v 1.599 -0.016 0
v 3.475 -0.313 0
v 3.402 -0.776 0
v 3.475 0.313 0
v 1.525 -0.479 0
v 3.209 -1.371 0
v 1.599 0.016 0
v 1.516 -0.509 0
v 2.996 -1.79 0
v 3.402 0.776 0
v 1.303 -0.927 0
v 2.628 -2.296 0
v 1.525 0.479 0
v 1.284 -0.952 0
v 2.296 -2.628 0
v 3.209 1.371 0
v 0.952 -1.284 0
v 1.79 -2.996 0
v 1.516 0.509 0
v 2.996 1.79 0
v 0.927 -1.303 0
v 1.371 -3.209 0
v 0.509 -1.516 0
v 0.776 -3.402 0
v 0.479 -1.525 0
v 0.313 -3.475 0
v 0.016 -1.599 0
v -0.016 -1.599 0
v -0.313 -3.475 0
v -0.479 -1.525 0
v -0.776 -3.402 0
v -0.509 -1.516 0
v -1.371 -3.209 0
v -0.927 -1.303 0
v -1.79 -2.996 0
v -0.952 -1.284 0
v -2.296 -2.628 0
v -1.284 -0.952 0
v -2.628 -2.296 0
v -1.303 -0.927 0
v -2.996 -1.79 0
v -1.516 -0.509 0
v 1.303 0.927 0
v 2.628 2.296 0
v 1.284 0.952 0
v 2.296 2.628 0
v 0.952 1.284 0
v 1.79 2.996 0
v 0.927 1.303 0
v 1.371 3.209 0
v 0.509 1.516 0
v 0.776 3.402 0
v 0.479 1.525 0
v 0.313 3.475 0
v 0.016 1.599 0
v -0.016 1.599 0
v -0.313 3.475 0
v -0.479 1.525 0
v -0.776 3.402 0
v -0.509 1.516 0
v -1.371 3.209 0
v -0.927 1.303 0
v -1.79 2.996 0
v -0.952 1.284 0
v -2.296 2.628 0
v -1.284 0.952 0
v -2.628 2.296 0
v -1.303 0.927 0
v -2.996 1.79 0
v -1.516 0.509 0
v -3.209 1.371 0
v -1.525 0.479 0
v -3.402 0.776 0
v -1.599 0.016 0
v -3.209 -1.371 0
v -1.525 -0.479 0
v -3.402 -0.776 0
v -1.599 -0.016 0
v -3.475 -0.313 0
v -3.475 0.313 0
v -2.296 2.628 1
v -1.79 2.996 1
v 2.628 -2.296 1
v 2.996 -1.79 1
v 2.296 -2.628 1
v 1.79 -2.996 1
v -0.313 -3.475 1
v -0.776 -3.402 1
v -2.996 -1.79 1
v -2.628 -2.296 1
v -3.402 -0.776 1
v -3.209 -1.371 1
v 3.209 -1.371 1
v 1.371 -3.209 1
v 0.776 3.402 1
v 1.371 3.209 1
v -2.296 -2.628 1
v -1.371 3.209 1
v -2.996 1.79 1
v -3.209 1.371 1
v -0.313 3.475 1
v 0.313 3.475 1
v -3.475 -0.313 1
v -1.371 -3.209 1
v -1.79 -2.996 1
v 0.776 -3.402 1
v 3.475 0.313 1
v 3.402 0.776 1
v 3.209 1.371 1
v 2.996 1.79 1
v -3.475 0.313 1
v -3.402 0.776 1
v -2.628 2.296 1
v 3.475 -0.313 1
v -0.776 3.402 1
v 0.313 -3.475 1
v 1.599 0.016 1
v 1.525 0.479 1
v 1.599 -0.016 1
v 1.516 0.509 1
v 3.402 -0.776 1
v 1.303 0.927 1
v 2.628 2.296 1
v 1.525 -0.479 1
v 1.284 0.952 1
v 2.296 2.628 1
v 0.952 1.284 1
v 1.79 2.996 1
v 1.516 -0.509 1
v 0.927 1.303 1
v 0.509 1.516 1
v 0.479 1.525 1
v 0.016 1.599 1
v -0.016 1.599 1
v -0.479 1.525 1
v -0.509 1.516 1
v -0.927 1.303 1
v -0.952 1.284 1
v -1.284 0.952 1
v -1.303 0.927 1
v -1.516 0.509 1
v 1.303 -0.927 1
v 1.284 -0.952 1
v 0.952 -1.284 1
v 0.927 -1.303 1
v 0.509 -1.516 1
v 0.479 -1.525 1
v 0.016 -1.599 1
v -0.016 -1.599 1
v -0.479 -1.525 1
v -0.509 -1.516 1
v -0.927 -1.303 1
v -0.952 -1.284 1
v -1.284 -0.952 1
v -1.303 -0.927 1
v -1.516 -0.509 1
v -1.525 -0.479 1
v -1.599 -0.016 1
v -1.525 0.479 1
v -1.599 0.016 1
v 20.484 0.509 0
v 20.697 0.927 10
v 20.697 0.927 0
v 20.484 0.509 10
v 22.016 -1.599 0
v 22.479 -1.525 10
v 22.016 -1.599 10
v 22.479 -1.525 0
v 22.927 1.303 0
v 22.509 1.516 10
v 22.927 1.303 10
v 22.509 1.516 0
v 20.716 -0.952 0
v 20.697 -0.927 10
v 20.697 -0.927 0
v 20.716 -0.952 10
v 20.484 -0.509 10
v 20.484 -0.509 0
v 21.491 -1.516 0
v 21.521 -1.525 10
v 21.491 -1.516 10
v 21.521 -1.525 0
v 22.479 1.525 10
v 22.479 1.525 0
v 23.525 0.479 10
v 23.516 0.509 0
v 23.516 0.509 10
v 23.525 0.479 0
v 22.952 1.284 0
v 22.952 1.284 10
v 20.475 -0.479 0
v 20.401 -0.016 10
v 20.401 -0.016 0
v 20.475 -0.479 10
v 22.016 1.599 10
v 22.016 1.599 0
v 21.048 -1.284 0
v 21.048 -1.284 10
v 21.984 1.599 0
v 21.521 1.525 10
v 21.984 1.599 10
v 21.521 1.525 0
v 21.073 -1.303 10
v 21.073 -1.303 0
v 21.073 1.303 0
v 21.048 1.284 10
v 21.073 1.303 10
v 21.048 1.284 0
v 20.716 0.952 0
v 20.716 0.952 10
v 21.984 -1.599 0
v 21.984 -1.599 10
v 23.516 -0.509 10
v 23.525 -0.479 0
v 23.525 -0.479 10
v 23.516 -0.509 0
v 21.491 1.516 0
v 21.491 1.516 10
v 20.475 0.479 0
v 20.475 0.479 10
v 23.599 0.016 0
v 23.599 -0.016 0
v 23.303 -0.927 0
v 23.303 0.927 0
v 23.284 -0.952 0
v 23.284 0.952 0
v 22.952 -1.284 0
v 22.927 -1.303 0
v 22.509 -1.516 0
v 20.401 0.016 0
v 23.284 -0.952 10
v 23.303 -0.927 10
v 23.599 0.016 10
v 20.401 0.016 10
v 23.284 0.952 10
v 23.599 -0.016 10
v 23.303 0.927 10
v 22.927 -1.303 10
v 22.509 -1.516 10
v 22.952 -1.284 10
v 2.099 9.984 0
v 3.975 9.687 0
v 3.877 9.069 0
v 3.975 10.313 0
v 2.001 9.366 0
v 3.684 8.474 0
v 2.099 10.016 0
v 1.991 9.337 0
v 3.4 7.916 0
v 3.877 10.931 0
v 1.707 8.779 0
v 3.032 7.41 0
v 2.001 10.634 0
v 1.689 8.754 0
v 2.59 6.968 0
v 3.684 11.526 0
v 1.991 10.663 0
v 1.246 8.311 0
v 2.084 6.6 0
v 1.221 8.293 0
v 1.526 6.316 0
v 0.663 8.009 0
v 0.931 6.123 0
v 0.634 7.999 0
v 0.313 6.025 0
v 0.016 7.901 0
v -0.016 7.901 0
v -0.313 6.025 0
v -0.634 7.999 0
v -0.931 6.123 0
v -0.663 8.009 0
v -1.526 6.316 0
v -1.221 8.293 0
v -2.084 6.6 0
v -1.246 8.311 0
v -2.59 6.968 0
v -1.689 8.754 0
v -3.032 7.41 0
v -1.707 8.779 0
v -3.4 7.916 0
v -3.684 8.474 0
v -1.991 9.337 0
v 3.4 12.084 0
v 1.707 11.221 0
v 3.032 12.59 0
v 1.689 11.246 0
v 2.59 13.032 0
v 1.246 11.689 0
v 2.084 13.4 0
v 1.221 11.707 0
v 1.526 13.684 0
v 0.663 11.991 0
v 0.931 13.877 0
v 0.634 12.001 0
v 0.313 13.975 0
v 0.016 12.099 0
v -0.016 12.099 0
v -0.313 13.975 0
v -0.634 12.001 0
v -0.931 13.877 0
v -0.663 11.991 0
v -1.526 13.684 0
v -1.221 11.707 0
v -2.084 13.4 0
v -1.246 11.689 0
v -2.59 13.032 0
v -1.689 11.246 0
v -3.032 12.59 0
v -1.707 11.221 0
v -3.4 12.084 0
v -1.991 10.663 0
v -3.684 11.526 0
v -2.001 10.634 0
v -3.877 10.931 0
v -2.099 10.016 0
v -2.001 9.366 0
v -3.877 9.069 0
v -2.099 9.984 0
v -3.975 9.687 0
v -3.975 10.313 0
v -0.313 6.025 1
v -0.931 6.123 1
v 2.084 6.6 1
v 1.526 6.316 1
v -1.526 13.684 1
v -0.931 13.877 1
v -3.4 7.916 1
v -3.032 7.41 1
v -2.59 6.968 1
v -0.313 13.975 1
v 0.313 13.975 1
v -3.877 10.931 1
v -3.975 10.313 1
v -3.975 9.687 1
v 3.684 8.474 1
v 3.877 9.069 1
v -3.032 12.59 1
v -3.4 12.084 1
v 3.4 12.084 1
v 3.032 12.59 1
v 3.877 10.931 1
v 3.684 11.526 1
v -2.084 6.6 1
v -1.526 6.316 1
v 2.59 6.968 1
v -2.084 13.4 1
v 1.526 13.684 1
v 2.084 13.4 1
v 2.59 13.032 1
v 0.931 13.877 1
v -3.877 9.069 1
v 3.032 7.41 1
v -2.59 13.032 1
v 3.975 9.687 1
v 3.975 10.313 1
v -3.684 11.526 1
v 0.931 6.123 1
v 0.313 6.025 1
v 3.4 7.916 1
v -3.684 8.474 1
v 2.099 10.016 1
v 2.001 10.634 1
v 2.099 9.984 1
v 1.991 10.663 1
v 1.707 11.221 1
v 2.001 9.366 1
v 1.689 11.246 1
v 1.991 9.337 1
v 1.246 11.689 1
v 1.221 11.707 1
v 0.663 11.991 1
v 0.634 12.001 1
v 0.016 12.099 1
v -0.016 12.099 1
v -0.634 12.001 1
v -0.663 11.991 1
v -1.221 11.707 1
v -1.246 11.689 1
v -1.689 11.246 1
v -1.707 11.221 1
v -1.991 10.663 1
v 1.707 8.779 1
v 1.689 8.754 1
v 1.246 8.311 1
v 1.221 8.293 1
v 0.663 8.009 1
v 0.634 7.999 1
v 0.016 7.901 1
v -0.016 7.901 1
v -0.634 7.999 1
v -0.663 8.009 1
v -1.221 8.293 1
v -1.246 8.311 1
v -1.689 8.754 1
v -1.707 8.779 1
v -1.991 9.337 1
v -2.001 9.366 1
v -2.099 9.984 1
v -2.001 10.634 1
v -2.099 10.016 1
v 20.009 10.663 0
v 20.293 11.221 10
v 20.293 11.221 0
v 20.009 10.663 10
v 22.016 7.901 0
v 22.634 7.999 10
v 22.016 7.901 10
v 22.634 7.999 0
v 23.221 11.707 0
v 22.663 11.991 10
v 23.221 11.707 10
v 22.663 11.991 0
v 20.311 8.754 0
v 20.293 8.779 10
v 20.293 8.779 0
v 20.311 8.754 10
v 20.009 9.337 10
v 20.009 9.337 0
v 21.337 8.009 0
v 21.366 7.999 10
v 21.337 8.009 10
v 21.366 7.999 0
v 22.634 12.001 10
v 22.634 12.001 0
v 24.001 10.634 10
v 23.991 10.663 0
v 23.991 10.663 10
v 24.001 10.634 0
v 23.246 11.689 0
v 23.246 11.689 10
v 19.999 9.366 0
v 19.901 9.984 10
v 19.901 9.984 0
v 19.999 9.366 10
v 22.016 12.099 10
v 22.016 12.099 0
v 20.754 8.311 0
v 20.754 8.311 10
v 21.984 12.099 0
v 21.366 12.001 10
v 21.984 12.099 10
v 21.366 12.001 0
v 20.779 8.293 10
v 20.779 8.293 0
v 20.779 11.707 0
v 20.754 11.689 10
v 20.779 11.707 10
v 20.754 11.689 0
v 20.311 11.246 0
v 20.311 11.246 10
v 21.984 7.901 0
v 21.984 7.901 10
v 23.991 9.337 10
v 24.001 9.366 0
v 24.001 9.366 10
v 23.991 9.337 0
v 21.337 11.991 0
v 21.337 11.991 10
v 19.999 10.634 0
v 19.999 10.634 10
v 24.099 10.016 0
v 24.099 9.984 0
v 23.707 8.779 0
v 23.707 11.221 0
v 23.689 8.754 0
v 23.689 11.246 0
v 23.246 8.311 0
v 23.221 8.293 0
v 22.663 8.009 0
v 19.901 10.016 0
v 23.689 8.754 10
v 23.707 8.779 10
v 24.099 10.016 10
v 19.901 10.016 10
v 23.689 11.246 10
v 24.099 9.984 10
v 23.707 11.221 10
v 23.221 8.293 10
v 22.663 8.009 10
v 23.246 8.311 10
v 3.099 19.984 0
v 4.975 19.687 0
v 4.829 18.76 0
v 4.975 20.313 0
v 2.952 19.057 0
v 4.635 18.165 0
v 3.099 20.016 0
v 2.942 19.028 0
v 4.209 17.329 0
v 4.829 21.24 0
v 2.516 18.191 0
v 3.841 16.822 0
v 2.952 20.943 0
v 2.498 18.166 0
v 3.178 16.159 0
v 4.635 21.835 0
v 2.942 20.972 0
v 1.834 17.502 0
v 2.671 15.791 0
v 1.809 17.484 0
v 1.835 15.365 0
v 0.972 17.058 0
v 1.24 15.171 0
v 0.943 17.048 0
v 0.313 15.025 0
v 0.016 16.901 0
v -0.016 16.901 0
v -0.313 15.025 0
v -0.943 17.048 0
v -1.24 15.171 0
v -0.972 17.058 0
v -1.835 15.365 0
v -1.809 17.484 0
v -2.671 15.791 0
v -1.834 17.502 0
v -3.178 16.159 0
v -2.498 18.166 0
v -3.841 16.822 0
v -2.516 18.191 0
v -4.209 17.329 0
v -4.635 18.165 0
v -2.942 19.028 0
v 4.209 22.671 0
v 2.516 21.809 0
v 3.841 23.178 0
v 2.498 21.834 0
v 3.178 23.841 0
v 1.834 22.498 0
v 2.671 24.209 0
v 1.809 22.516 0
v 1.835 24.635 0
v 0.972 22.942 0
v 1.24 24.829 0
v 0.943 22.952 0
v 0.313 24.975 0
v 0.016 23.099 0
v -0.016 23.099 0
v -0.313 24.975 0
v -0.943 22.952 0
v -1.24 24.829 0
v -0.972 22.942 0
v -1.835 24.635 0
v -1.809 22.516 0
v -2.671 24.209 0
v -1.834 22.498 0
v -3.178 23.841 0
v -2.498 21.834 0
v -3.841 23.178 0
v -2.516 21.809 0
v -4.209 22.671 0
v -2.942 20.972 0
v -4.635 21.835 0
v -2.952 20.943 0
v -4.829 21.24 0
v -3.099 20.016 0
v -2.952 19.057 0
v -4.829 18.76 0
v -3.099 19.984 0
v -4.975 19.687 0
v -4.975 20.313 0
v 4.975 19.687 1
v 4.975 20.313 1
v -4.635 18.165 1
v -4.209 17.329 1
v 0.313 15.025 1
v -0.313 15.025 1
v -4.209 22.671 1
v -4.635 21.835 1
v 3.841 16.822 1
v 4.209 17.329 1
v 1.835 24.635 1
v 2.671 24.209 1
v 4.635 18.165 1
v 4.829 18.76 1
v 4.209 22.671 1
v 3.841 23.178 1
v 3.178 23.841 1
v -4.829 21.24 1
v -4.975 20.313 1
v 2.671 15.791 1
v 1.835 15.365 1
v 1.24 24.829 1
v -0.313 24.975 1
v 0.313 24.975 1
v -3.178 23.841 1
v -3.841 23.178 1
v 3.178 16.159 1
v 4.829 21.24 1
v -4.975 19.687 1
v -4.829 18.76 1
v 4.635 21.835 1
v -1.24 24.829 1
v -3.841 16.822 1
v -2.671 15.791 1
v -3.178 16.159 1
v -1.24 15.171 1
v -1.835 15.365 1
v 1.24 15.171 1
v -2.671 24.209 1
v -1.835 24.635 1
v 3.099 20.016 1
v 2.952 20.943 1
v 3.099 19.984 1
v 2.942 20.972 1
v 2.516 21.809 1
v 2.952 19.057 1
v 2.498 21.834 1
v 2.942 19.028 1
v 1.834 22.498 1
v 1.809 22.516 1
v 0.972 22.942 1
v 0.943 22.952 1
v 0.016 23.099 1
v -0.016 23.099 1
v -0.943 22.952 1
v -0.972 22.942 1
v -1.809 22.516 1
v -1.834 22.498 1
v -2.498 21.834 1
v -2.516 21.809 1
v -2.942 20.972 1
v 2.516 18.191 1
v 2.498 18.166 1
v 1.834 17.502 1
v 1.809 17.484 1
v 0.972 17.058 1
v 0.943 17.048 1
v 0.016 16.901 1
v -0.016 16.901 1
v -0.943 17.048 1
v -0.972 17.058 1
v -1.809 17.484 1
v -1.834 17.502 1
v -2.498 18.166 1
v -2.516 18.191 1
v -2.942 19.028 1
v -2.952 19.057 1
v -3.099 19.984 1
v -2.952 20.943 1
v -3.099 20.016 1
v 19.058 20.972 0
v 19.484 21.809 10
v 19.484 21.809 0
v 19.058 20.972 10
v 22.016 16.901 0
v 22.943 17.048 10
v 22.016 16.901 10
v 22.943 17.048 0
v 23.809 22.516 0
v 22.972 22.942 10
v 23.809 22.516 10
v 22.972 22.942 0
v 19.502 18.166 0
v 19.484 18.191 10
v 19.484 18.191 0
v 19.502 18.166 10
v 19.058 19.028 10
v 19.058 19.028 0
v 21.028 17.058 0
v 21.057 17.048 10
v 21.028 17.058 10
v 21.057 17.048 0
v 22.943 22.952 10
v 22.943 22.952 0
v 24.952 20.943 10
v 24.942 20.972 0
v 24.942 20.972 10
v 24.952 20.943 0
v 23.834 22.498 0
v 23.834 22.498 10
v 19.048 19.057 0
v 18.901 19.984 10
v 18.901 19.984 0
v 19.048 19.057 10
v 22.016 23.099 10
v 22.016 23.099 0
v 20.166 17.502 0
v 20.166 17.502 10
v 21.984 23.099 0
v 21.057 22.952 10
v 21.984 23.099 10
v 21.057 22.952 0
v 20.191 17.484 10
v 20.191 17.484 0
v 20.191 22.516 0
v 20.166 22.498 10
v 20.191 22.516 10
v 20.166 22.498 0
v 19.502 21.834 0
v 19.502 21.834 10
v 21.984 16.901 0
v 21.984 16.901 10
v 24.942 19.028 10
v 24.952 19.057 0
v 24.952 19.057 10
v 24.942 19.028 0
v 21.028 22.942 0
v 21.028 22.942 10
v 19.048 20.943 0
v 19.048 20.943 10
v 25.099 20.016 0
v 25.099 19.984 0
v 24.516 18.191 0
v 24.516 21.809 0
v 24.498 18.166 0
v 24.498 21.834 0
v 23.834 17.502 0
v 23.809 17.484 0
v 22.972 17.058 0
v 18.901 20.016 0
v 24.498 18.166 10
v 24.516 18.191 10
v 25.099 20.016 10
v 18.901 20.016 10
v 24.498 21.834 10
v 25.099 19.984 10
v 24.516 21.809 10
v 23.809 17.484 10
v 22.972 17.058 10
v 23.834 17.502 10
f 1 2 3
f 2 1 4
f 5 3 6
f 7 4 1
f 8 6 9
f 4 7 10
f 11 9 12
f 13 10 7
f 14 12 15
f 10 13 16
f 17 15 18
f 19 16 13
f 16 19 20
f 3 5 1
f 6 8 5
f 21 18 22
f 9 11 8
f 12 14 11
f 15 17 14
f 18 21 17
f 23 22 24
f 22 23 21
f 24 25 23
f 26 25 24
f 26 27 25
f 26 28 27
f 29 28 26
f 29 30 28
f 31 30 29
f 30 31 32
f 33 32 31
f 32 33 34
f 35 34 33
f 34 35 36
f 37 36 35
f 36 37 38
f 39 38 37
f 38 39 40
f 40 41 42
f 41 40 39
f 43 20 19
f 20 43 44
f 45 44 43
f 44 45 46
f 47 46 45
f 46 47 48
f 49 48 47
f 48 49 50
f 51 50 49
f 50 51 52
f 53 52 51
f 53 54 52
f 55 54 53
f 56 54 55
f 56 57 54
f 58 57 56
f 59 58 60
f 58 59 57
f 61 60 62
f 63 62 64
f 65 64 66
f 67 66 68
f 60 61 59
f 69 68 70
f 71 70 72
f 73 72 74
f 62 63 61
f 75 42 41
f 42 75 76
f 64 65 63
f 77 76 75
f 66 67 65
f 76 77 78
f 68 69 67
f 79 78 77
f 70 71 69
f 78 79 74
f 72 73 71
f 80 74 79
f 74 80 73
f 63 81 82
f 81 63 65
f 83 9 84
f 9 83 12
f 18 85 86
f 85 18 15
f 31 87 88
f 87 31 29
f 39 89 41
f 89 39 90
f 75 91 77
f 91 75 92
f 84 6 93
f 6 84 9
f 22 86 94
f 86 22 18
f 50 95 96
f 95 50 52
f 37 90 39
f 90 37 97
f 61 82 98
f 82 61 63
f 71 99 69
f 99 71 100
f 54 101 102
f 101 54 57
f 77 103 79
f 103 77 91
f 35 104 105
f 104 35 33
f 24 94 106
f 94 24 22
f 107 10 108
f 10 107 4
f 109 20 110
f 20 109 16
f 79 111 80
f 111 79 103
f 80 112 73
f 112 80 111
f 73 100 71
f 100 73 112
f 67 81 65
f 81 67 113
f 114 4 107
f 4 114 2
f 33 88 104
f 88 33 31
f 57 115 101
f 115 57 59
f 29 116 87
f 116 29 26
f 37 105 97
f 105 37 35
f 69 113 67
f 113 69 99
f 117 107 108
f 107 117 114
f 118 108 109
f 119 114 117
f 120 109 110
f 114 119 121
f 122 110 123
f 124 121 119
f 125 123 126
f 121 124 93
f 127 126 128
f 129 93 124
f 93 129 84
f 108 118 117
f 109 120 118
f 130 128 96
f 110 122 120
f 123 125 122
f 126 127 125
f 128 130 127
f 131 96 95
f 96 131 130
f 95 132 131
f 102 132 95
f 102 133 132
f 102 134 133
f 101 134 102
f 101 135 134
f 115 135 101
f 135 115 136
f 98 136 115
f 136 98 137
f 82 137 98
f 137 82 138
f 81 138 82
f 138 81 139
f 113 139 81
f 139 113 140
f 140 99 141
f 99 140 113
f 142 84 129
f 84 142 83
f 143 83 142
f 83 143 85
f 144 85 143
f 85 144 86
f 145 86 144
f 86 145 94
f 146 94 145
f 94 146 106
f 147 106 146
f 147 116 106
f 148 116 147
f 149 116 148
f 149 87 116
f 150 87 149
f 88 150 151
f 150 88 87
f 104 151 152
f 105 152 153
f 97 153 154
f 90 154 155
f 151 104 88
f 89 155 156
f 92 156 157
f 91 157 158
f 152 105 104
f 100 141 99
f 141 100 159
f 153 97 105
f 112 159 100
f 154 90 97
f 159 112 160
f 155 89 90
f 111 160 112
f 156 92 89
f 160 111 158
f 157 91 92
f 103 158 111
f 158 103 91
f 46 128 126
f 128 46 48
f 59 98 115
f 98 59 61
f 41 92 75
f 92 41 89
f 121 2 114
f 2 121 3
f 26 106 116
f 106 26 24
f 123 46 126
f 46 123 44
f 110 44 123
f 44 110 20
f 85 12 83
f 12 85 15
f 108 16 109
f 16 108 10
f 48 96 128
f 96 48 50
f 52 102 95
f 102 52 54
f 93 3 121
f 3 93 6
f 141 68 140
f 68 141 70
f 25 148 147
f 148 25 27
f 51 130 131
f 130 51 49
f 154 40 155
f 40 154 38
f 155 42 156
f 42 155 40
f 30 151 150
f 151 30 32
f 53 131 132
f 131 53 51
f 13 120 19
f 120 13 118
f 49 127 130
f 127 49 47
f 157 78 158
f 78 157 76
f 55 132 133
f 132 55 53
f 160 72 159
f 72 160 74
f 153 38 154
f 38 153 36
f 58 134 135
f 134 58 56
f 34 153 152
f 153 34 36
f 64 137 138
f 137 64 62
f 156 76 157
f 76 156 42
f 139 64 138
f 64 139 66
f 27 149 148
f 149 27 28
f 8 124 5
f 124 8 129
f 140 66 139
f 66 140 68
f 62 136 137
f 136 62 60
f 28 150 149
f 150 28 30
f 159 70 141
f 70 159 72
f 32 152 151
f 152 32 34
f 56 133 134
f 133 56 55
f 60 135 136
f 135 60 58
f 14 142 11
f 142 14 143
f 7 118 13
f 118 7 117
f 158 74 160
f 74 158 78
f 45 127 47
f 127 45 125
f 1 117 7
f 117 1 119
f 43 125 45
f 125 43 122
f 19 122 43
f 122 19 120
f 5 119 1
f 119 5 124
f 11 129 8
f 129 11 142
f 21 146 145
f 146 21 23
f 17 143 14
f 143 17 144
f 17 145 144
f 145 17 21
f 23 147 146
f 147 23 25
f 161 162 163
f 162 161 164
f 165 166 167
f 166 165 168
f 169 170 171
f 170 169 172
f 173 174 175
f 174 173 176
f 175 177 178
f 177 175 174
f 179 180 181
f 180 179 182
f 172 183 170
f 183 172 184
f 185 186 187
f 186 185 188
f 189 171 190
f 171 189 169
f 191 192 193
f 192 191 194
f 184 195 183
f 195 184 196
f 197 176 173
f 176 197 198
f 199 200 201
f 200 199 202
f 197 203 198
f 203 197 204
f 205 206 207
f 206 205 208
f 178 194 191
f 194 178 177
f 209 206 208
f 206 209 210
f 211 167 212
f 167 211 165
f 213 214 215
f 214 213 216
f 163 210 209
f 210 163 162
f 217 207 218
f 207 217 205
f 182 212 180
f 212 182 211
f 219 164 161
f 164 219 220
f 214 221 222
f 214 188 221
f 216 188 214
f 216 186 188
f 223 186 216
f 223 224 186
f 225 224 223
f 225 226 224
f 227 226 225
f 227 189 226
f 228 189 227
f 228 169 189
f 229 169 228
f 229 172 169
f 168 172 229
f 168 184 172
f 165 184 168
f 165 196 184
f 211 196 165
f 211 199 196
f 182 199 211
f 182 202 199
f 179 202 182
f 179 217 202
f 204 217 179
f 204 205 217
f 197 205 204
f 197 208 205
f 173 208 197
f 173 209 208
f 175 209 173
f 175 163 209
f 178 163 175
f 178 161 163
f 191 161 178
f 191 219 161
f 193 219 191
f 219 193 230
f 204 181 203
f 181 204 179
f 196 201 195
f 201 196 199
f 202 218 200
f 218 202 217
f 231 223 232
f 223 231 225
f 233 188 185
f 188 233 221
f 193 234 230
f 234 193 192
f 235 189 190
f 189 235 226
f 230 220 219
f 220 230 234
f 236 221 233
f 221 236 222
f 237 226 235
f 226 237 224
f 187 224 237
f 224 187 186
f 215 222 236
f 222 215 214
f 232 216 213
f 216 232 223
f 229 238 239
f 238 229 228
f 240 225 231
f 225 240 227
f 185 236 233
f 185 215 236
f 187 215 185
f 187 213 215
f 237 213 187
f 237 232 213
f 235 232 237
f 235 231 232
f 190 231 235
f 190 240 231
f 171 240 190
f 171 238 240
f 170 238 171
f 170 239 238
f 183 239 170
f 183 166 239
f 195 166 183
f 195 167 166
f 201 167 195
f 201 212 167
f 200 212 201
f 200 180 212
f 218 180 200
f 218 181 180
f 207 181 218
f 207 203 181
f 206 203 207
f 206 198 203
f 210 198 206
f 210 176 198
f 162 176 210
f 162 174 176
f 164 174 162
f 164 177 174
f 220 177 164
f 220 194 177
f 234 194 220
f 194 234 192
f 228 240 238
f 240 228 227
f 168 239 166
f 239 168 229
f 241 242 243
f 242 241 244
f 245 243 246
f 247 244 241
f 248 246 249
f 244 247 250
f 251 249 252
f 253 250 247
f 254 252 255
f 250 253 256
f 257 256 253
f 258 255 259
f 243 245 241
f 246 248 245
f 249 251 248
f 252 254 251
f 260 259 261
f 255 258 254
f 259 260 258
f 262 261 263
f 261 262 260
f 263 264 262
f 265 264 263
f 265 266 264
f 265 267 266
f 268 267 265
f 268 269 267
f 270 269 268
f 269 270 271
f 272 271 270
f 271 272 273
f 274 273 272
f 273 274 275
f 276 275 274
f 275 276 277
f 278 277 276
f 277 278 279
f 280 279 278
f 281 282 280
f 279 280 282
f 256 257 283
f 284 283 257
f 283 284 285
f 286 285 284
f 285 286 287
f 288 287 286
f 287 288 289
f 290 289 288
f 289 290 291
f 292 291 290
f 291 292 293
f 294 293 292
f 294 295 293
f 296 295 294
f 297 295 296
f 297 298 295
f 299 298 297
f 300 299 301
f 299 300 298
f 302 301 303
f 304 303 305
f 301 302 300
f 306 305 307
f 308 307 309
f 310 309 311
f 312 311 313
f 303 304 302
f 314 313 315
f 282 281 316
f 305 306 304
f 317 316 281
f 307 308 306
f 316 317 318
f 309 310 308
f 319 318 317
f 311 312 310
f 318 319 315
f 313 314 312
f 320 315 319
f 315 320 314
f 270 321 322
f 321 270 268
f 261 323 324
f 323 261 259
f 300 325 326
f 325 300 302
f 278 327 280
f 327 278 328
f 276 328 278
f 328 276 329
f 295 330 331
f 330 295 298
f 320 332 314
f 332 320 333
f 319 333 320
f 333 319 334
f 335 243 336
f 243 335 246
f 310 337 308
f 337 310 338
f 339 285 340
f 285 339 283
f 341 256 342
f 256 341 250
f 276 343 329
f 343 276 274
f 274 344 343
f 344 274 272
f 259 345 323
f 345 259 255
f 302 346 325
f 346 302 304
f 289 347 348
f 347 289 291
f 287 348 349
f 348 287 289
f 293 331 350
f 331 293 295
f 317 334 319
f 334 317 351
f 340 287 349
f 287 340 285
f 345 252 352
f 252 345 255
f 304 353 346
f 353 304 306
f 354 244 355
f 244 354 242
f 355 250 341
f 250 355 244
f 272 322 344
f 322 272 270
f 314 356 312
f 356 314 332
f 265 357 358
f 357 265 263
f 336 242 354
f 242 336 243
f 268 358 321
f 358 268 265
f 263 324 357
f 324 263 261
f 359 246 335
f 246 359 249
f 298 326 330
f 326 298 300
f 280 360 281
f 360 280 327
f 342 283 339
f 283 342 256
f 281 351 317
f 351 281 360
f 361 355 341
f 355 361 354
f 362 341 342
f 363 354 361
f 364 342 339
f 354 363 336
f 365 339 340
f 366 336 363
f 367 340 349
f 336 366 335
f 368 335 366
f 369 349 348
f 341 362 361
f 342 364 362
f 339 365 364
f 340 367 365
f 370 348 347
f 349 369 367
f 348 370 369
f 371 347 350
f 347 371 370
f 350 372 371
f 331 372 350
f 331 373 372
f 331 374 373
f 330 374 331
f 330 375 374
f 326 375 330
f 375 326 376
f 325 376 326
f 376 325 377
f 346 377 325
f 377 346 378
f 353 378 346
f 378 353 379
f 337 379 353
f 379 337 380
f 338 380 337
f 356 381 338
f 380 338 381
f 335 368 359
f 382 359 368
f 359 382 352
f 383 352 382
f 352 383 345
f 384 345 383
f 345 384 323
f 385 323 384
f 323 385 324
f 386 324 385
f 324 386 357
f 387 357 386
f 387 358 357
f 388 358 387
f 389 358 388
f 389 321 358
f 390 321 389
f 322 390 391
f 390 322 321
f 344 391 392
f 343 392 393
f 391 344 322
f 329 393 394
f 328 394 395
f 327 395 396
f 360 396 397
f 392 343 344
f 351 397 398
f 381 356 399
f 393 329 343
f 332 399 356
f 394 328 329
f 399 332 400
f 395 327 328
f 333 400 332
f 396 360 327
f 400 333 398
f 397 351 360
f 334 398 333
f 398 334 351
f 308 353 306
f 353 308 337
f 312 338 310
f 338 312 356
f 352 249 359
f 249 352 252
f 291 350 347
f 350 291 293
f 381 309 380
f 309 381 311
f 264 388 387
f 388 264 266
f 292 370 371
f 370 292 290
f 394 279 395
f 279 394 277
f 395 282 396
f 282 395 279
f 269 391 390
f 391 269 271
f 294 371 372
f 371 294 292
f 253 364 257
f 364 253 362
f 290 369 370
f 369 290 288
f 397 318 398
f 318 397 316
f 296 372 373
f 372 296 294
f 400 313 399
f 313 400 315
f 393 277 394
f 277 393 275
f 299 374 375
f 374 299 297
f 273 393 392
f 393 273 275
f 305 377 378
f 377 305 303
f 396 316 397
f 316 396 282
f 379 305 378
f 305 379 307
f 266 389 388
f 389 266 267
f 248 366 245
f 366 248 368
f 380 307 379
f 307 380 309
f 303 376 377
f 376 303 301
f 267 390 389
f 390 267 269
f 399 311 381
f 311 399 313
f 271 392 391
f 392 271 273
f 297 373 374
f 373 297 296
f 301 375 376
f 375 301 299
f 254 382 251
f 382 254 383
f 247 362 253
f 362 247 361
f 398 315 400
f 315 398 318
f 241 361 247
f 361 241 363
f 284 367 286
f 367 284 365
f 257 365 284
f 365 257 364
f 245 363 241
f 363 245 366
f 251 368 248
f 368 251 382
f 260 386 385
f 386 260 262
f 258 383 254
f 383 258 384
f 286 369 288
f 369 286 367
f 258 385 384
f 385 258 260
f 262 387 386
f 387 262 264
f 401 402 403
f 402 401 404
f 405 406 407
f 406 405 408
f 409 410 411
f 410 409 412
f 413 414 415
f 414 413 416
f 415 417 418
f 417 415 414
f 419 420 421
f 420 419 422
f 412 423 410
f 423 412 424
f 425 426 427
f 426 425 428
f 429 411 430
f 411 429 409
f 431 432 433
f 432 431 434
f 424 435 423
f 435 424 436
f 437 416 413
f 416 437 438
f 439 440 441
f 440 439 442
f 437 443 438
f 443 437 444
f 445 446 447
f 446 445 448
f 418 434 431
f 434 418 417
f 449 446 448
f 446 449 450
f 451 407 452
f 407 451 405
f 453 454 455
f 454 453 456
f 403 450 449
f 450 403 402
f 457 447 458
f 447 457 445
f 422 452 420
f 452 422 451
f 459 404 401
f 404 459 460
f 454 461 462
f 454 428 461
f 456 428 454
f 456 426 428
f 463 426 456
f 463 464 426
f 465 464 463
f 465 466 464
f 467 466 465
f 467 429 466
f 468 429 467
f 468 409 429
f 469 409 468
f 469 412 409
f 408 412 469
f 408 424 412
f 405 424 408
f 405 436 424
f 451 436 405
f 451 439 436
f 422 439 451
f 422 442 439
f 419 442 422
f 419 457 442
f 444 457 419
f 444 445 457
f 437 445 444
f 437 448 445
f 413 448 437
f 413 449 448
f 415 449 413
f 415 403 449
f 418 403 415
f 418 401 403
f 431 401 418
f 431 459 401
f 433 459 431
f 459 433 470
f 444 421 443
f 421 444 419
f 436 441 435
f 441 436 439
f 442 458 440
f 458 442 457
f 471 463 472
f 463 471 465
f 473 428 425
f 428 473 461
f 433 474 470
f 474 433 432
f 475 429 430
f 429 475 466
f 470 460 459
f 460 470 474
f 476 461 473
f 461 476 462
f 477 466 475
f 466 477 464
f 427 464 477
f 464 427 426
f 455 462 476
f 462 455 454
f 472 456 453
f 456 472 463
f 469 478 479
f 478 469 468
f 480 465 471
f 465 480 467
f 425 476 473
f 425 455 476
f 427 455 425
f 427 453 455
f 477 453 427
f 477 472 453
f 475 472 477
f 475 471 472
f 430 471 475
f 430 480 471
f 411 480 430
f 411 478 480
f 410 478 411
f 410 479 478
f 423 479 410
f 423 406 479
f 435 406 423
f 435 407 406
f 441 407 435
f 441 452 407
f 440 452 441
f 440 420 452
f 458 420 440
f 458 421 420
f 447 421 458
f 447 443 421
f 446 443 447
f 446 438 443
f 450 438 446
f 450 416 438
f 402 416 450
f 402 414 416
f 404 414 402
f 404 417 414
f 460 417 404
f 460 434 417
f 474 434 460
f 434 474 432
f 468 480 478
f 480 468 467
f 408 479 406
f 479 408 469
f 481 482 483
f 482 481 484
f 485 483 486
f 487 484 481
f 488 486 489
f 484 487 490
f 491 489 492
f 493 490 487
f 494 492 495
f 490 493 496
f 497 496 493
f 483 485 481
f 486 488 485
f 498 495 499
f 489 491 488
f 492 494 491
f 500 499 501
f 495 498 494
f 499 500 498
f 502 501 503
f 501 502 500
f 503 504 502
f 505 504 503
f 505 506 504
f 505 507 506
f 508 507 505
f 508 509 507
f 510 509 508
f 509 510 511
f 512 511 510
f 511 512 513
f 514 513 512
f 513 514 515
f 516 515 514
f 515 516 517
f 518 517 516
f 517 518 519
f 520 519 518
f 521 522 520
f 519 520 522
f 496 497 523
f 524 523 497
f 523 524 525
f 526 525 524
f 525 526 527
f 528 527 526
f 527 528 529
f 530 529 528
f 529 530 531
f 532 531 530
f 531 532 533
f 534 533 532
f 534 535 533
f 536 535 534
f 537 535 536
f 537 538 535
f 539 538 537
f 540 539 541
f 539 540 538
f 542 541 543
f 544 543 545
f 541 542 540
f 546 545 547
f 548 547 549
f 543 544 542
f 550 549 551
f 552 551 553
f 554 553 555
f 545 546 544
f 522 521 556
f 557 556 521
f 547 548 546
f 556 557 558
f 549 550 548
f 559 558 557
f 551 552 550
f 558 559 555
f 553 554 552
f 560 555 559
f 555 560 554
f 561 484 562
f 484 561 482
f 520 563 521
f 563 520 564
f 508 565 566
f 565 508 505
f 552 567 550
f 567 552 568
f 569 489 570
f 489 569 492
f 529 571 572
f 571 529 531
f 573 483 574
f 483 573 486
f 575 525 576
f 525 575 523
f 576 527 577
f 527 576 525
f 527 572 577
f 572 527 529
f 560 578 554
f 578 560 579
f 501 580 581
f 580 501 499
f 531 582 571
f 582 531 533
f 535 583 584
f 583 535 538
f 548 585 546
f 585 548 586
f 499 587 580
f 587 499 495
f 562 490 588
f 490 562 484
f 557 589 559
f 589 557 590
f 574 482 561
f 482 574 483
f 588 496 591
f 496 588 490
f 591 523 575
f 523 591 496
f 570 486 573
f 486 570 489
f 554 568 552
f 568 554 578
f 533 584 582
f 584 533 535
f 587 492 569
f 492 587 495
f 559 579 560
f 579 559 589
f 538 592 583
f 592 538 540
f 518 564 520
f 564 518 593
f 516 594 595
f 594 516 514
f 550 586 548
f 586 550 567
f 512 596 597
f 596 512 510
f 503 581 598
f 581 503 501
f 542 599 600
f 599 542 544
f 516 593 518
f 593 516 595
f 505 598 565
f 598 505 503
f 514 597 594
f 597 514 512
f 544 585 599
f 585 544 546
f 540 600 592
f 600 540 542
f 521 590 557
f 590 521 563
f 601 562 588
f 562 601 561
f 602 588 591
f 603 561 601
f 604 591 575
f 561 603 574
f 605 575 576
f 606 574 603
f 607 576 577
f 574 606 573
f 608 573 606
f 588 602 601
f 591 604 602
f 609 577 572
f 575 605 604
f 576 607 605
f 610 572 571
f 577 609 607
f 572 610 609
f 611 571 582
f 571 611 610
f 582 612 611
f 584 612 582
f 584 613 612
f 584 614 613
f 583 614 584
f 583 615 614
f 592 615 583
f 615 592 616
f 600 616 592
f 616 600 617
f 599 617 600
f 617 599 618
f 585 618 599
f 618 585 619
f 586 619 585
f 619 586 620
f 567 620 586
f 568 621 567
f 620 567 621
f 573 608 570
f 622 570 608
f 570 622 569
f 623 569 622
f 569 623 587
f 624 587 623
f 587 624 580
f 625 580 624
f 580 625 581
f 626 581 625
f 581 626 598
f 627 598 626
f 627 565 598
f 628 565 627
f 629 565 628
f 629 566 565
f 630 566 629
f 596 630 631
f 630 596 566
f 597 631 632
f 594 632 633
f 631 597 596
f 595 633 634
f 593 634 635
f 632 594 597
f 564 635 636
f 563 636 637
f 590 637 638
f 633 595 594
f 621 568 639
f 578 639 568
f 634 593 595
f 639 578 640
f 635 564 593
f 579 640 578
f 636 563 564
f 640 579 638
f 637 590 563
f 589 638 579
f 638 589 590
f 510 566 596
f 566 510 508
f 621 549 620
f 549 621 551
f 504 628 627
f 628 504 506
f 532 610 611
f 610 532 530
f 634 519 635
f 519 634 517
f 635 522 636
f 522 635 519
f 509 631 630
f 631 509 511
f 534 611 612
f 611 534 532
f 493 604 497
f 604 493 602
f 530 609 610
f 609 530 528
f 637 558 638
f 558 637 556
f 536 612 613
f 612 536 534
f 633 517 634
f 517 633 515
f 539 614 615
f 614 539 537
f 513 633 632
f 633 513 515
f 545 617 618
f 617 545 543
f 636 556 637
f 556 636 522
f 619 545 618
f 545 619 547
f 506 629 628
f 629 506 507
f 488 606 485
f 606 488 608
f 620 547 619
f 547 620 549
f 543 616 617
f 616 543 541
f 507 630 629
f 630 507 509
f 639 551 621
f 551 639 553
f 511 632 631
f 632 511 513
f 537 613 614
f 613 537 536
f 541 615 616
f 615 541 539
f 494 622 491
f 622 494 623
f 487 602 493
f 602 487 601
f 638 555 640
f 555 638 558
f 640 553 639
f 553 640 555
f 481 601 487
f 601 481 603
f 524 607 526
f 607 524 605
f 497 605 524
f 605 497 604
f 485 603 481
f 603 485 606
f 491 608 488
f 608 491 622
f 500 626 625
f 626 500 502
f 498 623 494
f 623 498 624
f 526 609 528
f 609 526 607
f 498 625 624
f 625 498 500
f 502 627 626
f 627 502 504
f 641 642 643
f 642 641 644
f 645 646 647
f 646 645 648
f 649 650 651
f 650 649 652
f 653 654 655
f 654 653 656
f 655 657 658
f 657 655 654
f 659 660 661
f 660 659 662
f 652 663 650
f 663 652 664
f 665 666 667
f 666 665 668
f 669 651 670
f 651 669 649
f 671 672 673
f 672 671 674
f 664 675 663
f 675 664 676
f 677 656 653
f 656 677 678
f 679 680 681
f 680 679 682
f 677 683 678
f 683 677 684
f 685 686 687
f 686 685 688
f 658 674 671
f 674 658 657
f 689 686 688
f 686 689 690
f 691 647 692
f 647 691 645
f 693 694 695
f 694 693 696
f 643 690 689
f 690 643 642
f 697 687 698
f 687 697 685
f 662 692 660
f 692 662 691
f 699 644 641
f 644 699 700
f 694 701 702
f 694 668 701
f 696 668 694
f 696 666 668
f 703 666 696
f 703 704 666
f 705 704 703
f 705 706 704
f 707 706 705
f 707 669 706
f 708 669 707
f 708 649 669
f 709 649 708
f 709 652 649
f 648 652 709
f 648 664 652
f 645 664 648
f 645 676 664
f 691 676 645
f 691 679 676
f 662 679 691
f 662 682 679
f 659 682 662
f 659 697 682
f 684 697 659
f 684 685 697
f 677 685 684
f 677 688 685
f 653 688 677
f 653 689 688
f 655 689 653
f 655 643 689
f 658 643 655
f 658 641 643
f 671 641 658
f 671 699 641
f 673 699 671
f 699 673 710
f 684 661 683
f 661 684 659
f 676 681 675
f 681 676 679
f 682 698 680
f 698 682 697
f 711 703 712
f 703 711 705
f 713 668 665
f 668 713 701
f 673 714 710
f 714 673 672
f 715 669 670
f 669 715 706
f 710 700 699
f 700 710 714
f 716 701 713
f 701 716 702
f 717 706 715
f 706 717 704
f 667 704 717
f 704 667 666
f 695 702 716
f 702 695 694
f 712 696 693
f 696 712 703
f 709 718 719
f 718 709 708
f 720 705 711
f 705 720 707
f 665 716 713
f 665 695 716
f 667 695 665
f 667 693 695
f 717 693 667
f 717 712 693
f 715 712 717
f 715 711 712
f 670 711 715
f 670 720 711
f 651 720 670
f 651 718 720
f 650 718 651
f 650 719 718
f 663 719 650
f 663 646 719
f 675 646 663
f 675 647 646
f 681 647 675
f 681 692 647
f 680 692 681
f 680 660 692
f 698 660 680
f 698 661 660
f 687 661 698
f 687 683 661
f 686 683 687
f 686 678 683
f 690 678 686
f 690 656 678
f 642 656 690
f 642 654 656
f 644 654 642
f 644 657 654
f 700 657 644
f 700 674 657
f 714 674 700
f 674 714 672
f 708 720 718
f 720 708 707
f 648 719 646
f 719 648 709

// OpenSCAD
// file: ../../../lib/circuits/support.scad
module support_pcb_drill(mm=2) {
  offset(0.1)
    circle(d=mm, $fn=20);
}

module support_pcb_traces(mm=2) {
}

module support_pcb_outline(mm=2) {
  offset(2)
    circle(d=mm, $fn=20);
}

module support_space_outline(mm=2) {
  linear_extrude(10)
    offset(0.1)
      circle(d=mm, $fn=20);
}
// main file
use <../../../lib/circuits/support.scad>

module support_test(mm=3){
  difference(){
    union(){
      linear_extrude(0.5)
        projection()
          support_space_outline(mm);
      color("green")
        linear_extrude(1)
          support_pcb_outline(mm);
      color("red")
        linear_extrude(1.5)
          support_pcb_traces(mm);
    }
    translate([0,0,-1])
      linear_extrude(3)
        support_pcb_drill(mm);
  }

  translate([22,0]) {
    support_space_outline(mm);
  }
}

support_test(3);

translate([0,10])
  support_test(4);

translate([0,20])
  support_test(6);
